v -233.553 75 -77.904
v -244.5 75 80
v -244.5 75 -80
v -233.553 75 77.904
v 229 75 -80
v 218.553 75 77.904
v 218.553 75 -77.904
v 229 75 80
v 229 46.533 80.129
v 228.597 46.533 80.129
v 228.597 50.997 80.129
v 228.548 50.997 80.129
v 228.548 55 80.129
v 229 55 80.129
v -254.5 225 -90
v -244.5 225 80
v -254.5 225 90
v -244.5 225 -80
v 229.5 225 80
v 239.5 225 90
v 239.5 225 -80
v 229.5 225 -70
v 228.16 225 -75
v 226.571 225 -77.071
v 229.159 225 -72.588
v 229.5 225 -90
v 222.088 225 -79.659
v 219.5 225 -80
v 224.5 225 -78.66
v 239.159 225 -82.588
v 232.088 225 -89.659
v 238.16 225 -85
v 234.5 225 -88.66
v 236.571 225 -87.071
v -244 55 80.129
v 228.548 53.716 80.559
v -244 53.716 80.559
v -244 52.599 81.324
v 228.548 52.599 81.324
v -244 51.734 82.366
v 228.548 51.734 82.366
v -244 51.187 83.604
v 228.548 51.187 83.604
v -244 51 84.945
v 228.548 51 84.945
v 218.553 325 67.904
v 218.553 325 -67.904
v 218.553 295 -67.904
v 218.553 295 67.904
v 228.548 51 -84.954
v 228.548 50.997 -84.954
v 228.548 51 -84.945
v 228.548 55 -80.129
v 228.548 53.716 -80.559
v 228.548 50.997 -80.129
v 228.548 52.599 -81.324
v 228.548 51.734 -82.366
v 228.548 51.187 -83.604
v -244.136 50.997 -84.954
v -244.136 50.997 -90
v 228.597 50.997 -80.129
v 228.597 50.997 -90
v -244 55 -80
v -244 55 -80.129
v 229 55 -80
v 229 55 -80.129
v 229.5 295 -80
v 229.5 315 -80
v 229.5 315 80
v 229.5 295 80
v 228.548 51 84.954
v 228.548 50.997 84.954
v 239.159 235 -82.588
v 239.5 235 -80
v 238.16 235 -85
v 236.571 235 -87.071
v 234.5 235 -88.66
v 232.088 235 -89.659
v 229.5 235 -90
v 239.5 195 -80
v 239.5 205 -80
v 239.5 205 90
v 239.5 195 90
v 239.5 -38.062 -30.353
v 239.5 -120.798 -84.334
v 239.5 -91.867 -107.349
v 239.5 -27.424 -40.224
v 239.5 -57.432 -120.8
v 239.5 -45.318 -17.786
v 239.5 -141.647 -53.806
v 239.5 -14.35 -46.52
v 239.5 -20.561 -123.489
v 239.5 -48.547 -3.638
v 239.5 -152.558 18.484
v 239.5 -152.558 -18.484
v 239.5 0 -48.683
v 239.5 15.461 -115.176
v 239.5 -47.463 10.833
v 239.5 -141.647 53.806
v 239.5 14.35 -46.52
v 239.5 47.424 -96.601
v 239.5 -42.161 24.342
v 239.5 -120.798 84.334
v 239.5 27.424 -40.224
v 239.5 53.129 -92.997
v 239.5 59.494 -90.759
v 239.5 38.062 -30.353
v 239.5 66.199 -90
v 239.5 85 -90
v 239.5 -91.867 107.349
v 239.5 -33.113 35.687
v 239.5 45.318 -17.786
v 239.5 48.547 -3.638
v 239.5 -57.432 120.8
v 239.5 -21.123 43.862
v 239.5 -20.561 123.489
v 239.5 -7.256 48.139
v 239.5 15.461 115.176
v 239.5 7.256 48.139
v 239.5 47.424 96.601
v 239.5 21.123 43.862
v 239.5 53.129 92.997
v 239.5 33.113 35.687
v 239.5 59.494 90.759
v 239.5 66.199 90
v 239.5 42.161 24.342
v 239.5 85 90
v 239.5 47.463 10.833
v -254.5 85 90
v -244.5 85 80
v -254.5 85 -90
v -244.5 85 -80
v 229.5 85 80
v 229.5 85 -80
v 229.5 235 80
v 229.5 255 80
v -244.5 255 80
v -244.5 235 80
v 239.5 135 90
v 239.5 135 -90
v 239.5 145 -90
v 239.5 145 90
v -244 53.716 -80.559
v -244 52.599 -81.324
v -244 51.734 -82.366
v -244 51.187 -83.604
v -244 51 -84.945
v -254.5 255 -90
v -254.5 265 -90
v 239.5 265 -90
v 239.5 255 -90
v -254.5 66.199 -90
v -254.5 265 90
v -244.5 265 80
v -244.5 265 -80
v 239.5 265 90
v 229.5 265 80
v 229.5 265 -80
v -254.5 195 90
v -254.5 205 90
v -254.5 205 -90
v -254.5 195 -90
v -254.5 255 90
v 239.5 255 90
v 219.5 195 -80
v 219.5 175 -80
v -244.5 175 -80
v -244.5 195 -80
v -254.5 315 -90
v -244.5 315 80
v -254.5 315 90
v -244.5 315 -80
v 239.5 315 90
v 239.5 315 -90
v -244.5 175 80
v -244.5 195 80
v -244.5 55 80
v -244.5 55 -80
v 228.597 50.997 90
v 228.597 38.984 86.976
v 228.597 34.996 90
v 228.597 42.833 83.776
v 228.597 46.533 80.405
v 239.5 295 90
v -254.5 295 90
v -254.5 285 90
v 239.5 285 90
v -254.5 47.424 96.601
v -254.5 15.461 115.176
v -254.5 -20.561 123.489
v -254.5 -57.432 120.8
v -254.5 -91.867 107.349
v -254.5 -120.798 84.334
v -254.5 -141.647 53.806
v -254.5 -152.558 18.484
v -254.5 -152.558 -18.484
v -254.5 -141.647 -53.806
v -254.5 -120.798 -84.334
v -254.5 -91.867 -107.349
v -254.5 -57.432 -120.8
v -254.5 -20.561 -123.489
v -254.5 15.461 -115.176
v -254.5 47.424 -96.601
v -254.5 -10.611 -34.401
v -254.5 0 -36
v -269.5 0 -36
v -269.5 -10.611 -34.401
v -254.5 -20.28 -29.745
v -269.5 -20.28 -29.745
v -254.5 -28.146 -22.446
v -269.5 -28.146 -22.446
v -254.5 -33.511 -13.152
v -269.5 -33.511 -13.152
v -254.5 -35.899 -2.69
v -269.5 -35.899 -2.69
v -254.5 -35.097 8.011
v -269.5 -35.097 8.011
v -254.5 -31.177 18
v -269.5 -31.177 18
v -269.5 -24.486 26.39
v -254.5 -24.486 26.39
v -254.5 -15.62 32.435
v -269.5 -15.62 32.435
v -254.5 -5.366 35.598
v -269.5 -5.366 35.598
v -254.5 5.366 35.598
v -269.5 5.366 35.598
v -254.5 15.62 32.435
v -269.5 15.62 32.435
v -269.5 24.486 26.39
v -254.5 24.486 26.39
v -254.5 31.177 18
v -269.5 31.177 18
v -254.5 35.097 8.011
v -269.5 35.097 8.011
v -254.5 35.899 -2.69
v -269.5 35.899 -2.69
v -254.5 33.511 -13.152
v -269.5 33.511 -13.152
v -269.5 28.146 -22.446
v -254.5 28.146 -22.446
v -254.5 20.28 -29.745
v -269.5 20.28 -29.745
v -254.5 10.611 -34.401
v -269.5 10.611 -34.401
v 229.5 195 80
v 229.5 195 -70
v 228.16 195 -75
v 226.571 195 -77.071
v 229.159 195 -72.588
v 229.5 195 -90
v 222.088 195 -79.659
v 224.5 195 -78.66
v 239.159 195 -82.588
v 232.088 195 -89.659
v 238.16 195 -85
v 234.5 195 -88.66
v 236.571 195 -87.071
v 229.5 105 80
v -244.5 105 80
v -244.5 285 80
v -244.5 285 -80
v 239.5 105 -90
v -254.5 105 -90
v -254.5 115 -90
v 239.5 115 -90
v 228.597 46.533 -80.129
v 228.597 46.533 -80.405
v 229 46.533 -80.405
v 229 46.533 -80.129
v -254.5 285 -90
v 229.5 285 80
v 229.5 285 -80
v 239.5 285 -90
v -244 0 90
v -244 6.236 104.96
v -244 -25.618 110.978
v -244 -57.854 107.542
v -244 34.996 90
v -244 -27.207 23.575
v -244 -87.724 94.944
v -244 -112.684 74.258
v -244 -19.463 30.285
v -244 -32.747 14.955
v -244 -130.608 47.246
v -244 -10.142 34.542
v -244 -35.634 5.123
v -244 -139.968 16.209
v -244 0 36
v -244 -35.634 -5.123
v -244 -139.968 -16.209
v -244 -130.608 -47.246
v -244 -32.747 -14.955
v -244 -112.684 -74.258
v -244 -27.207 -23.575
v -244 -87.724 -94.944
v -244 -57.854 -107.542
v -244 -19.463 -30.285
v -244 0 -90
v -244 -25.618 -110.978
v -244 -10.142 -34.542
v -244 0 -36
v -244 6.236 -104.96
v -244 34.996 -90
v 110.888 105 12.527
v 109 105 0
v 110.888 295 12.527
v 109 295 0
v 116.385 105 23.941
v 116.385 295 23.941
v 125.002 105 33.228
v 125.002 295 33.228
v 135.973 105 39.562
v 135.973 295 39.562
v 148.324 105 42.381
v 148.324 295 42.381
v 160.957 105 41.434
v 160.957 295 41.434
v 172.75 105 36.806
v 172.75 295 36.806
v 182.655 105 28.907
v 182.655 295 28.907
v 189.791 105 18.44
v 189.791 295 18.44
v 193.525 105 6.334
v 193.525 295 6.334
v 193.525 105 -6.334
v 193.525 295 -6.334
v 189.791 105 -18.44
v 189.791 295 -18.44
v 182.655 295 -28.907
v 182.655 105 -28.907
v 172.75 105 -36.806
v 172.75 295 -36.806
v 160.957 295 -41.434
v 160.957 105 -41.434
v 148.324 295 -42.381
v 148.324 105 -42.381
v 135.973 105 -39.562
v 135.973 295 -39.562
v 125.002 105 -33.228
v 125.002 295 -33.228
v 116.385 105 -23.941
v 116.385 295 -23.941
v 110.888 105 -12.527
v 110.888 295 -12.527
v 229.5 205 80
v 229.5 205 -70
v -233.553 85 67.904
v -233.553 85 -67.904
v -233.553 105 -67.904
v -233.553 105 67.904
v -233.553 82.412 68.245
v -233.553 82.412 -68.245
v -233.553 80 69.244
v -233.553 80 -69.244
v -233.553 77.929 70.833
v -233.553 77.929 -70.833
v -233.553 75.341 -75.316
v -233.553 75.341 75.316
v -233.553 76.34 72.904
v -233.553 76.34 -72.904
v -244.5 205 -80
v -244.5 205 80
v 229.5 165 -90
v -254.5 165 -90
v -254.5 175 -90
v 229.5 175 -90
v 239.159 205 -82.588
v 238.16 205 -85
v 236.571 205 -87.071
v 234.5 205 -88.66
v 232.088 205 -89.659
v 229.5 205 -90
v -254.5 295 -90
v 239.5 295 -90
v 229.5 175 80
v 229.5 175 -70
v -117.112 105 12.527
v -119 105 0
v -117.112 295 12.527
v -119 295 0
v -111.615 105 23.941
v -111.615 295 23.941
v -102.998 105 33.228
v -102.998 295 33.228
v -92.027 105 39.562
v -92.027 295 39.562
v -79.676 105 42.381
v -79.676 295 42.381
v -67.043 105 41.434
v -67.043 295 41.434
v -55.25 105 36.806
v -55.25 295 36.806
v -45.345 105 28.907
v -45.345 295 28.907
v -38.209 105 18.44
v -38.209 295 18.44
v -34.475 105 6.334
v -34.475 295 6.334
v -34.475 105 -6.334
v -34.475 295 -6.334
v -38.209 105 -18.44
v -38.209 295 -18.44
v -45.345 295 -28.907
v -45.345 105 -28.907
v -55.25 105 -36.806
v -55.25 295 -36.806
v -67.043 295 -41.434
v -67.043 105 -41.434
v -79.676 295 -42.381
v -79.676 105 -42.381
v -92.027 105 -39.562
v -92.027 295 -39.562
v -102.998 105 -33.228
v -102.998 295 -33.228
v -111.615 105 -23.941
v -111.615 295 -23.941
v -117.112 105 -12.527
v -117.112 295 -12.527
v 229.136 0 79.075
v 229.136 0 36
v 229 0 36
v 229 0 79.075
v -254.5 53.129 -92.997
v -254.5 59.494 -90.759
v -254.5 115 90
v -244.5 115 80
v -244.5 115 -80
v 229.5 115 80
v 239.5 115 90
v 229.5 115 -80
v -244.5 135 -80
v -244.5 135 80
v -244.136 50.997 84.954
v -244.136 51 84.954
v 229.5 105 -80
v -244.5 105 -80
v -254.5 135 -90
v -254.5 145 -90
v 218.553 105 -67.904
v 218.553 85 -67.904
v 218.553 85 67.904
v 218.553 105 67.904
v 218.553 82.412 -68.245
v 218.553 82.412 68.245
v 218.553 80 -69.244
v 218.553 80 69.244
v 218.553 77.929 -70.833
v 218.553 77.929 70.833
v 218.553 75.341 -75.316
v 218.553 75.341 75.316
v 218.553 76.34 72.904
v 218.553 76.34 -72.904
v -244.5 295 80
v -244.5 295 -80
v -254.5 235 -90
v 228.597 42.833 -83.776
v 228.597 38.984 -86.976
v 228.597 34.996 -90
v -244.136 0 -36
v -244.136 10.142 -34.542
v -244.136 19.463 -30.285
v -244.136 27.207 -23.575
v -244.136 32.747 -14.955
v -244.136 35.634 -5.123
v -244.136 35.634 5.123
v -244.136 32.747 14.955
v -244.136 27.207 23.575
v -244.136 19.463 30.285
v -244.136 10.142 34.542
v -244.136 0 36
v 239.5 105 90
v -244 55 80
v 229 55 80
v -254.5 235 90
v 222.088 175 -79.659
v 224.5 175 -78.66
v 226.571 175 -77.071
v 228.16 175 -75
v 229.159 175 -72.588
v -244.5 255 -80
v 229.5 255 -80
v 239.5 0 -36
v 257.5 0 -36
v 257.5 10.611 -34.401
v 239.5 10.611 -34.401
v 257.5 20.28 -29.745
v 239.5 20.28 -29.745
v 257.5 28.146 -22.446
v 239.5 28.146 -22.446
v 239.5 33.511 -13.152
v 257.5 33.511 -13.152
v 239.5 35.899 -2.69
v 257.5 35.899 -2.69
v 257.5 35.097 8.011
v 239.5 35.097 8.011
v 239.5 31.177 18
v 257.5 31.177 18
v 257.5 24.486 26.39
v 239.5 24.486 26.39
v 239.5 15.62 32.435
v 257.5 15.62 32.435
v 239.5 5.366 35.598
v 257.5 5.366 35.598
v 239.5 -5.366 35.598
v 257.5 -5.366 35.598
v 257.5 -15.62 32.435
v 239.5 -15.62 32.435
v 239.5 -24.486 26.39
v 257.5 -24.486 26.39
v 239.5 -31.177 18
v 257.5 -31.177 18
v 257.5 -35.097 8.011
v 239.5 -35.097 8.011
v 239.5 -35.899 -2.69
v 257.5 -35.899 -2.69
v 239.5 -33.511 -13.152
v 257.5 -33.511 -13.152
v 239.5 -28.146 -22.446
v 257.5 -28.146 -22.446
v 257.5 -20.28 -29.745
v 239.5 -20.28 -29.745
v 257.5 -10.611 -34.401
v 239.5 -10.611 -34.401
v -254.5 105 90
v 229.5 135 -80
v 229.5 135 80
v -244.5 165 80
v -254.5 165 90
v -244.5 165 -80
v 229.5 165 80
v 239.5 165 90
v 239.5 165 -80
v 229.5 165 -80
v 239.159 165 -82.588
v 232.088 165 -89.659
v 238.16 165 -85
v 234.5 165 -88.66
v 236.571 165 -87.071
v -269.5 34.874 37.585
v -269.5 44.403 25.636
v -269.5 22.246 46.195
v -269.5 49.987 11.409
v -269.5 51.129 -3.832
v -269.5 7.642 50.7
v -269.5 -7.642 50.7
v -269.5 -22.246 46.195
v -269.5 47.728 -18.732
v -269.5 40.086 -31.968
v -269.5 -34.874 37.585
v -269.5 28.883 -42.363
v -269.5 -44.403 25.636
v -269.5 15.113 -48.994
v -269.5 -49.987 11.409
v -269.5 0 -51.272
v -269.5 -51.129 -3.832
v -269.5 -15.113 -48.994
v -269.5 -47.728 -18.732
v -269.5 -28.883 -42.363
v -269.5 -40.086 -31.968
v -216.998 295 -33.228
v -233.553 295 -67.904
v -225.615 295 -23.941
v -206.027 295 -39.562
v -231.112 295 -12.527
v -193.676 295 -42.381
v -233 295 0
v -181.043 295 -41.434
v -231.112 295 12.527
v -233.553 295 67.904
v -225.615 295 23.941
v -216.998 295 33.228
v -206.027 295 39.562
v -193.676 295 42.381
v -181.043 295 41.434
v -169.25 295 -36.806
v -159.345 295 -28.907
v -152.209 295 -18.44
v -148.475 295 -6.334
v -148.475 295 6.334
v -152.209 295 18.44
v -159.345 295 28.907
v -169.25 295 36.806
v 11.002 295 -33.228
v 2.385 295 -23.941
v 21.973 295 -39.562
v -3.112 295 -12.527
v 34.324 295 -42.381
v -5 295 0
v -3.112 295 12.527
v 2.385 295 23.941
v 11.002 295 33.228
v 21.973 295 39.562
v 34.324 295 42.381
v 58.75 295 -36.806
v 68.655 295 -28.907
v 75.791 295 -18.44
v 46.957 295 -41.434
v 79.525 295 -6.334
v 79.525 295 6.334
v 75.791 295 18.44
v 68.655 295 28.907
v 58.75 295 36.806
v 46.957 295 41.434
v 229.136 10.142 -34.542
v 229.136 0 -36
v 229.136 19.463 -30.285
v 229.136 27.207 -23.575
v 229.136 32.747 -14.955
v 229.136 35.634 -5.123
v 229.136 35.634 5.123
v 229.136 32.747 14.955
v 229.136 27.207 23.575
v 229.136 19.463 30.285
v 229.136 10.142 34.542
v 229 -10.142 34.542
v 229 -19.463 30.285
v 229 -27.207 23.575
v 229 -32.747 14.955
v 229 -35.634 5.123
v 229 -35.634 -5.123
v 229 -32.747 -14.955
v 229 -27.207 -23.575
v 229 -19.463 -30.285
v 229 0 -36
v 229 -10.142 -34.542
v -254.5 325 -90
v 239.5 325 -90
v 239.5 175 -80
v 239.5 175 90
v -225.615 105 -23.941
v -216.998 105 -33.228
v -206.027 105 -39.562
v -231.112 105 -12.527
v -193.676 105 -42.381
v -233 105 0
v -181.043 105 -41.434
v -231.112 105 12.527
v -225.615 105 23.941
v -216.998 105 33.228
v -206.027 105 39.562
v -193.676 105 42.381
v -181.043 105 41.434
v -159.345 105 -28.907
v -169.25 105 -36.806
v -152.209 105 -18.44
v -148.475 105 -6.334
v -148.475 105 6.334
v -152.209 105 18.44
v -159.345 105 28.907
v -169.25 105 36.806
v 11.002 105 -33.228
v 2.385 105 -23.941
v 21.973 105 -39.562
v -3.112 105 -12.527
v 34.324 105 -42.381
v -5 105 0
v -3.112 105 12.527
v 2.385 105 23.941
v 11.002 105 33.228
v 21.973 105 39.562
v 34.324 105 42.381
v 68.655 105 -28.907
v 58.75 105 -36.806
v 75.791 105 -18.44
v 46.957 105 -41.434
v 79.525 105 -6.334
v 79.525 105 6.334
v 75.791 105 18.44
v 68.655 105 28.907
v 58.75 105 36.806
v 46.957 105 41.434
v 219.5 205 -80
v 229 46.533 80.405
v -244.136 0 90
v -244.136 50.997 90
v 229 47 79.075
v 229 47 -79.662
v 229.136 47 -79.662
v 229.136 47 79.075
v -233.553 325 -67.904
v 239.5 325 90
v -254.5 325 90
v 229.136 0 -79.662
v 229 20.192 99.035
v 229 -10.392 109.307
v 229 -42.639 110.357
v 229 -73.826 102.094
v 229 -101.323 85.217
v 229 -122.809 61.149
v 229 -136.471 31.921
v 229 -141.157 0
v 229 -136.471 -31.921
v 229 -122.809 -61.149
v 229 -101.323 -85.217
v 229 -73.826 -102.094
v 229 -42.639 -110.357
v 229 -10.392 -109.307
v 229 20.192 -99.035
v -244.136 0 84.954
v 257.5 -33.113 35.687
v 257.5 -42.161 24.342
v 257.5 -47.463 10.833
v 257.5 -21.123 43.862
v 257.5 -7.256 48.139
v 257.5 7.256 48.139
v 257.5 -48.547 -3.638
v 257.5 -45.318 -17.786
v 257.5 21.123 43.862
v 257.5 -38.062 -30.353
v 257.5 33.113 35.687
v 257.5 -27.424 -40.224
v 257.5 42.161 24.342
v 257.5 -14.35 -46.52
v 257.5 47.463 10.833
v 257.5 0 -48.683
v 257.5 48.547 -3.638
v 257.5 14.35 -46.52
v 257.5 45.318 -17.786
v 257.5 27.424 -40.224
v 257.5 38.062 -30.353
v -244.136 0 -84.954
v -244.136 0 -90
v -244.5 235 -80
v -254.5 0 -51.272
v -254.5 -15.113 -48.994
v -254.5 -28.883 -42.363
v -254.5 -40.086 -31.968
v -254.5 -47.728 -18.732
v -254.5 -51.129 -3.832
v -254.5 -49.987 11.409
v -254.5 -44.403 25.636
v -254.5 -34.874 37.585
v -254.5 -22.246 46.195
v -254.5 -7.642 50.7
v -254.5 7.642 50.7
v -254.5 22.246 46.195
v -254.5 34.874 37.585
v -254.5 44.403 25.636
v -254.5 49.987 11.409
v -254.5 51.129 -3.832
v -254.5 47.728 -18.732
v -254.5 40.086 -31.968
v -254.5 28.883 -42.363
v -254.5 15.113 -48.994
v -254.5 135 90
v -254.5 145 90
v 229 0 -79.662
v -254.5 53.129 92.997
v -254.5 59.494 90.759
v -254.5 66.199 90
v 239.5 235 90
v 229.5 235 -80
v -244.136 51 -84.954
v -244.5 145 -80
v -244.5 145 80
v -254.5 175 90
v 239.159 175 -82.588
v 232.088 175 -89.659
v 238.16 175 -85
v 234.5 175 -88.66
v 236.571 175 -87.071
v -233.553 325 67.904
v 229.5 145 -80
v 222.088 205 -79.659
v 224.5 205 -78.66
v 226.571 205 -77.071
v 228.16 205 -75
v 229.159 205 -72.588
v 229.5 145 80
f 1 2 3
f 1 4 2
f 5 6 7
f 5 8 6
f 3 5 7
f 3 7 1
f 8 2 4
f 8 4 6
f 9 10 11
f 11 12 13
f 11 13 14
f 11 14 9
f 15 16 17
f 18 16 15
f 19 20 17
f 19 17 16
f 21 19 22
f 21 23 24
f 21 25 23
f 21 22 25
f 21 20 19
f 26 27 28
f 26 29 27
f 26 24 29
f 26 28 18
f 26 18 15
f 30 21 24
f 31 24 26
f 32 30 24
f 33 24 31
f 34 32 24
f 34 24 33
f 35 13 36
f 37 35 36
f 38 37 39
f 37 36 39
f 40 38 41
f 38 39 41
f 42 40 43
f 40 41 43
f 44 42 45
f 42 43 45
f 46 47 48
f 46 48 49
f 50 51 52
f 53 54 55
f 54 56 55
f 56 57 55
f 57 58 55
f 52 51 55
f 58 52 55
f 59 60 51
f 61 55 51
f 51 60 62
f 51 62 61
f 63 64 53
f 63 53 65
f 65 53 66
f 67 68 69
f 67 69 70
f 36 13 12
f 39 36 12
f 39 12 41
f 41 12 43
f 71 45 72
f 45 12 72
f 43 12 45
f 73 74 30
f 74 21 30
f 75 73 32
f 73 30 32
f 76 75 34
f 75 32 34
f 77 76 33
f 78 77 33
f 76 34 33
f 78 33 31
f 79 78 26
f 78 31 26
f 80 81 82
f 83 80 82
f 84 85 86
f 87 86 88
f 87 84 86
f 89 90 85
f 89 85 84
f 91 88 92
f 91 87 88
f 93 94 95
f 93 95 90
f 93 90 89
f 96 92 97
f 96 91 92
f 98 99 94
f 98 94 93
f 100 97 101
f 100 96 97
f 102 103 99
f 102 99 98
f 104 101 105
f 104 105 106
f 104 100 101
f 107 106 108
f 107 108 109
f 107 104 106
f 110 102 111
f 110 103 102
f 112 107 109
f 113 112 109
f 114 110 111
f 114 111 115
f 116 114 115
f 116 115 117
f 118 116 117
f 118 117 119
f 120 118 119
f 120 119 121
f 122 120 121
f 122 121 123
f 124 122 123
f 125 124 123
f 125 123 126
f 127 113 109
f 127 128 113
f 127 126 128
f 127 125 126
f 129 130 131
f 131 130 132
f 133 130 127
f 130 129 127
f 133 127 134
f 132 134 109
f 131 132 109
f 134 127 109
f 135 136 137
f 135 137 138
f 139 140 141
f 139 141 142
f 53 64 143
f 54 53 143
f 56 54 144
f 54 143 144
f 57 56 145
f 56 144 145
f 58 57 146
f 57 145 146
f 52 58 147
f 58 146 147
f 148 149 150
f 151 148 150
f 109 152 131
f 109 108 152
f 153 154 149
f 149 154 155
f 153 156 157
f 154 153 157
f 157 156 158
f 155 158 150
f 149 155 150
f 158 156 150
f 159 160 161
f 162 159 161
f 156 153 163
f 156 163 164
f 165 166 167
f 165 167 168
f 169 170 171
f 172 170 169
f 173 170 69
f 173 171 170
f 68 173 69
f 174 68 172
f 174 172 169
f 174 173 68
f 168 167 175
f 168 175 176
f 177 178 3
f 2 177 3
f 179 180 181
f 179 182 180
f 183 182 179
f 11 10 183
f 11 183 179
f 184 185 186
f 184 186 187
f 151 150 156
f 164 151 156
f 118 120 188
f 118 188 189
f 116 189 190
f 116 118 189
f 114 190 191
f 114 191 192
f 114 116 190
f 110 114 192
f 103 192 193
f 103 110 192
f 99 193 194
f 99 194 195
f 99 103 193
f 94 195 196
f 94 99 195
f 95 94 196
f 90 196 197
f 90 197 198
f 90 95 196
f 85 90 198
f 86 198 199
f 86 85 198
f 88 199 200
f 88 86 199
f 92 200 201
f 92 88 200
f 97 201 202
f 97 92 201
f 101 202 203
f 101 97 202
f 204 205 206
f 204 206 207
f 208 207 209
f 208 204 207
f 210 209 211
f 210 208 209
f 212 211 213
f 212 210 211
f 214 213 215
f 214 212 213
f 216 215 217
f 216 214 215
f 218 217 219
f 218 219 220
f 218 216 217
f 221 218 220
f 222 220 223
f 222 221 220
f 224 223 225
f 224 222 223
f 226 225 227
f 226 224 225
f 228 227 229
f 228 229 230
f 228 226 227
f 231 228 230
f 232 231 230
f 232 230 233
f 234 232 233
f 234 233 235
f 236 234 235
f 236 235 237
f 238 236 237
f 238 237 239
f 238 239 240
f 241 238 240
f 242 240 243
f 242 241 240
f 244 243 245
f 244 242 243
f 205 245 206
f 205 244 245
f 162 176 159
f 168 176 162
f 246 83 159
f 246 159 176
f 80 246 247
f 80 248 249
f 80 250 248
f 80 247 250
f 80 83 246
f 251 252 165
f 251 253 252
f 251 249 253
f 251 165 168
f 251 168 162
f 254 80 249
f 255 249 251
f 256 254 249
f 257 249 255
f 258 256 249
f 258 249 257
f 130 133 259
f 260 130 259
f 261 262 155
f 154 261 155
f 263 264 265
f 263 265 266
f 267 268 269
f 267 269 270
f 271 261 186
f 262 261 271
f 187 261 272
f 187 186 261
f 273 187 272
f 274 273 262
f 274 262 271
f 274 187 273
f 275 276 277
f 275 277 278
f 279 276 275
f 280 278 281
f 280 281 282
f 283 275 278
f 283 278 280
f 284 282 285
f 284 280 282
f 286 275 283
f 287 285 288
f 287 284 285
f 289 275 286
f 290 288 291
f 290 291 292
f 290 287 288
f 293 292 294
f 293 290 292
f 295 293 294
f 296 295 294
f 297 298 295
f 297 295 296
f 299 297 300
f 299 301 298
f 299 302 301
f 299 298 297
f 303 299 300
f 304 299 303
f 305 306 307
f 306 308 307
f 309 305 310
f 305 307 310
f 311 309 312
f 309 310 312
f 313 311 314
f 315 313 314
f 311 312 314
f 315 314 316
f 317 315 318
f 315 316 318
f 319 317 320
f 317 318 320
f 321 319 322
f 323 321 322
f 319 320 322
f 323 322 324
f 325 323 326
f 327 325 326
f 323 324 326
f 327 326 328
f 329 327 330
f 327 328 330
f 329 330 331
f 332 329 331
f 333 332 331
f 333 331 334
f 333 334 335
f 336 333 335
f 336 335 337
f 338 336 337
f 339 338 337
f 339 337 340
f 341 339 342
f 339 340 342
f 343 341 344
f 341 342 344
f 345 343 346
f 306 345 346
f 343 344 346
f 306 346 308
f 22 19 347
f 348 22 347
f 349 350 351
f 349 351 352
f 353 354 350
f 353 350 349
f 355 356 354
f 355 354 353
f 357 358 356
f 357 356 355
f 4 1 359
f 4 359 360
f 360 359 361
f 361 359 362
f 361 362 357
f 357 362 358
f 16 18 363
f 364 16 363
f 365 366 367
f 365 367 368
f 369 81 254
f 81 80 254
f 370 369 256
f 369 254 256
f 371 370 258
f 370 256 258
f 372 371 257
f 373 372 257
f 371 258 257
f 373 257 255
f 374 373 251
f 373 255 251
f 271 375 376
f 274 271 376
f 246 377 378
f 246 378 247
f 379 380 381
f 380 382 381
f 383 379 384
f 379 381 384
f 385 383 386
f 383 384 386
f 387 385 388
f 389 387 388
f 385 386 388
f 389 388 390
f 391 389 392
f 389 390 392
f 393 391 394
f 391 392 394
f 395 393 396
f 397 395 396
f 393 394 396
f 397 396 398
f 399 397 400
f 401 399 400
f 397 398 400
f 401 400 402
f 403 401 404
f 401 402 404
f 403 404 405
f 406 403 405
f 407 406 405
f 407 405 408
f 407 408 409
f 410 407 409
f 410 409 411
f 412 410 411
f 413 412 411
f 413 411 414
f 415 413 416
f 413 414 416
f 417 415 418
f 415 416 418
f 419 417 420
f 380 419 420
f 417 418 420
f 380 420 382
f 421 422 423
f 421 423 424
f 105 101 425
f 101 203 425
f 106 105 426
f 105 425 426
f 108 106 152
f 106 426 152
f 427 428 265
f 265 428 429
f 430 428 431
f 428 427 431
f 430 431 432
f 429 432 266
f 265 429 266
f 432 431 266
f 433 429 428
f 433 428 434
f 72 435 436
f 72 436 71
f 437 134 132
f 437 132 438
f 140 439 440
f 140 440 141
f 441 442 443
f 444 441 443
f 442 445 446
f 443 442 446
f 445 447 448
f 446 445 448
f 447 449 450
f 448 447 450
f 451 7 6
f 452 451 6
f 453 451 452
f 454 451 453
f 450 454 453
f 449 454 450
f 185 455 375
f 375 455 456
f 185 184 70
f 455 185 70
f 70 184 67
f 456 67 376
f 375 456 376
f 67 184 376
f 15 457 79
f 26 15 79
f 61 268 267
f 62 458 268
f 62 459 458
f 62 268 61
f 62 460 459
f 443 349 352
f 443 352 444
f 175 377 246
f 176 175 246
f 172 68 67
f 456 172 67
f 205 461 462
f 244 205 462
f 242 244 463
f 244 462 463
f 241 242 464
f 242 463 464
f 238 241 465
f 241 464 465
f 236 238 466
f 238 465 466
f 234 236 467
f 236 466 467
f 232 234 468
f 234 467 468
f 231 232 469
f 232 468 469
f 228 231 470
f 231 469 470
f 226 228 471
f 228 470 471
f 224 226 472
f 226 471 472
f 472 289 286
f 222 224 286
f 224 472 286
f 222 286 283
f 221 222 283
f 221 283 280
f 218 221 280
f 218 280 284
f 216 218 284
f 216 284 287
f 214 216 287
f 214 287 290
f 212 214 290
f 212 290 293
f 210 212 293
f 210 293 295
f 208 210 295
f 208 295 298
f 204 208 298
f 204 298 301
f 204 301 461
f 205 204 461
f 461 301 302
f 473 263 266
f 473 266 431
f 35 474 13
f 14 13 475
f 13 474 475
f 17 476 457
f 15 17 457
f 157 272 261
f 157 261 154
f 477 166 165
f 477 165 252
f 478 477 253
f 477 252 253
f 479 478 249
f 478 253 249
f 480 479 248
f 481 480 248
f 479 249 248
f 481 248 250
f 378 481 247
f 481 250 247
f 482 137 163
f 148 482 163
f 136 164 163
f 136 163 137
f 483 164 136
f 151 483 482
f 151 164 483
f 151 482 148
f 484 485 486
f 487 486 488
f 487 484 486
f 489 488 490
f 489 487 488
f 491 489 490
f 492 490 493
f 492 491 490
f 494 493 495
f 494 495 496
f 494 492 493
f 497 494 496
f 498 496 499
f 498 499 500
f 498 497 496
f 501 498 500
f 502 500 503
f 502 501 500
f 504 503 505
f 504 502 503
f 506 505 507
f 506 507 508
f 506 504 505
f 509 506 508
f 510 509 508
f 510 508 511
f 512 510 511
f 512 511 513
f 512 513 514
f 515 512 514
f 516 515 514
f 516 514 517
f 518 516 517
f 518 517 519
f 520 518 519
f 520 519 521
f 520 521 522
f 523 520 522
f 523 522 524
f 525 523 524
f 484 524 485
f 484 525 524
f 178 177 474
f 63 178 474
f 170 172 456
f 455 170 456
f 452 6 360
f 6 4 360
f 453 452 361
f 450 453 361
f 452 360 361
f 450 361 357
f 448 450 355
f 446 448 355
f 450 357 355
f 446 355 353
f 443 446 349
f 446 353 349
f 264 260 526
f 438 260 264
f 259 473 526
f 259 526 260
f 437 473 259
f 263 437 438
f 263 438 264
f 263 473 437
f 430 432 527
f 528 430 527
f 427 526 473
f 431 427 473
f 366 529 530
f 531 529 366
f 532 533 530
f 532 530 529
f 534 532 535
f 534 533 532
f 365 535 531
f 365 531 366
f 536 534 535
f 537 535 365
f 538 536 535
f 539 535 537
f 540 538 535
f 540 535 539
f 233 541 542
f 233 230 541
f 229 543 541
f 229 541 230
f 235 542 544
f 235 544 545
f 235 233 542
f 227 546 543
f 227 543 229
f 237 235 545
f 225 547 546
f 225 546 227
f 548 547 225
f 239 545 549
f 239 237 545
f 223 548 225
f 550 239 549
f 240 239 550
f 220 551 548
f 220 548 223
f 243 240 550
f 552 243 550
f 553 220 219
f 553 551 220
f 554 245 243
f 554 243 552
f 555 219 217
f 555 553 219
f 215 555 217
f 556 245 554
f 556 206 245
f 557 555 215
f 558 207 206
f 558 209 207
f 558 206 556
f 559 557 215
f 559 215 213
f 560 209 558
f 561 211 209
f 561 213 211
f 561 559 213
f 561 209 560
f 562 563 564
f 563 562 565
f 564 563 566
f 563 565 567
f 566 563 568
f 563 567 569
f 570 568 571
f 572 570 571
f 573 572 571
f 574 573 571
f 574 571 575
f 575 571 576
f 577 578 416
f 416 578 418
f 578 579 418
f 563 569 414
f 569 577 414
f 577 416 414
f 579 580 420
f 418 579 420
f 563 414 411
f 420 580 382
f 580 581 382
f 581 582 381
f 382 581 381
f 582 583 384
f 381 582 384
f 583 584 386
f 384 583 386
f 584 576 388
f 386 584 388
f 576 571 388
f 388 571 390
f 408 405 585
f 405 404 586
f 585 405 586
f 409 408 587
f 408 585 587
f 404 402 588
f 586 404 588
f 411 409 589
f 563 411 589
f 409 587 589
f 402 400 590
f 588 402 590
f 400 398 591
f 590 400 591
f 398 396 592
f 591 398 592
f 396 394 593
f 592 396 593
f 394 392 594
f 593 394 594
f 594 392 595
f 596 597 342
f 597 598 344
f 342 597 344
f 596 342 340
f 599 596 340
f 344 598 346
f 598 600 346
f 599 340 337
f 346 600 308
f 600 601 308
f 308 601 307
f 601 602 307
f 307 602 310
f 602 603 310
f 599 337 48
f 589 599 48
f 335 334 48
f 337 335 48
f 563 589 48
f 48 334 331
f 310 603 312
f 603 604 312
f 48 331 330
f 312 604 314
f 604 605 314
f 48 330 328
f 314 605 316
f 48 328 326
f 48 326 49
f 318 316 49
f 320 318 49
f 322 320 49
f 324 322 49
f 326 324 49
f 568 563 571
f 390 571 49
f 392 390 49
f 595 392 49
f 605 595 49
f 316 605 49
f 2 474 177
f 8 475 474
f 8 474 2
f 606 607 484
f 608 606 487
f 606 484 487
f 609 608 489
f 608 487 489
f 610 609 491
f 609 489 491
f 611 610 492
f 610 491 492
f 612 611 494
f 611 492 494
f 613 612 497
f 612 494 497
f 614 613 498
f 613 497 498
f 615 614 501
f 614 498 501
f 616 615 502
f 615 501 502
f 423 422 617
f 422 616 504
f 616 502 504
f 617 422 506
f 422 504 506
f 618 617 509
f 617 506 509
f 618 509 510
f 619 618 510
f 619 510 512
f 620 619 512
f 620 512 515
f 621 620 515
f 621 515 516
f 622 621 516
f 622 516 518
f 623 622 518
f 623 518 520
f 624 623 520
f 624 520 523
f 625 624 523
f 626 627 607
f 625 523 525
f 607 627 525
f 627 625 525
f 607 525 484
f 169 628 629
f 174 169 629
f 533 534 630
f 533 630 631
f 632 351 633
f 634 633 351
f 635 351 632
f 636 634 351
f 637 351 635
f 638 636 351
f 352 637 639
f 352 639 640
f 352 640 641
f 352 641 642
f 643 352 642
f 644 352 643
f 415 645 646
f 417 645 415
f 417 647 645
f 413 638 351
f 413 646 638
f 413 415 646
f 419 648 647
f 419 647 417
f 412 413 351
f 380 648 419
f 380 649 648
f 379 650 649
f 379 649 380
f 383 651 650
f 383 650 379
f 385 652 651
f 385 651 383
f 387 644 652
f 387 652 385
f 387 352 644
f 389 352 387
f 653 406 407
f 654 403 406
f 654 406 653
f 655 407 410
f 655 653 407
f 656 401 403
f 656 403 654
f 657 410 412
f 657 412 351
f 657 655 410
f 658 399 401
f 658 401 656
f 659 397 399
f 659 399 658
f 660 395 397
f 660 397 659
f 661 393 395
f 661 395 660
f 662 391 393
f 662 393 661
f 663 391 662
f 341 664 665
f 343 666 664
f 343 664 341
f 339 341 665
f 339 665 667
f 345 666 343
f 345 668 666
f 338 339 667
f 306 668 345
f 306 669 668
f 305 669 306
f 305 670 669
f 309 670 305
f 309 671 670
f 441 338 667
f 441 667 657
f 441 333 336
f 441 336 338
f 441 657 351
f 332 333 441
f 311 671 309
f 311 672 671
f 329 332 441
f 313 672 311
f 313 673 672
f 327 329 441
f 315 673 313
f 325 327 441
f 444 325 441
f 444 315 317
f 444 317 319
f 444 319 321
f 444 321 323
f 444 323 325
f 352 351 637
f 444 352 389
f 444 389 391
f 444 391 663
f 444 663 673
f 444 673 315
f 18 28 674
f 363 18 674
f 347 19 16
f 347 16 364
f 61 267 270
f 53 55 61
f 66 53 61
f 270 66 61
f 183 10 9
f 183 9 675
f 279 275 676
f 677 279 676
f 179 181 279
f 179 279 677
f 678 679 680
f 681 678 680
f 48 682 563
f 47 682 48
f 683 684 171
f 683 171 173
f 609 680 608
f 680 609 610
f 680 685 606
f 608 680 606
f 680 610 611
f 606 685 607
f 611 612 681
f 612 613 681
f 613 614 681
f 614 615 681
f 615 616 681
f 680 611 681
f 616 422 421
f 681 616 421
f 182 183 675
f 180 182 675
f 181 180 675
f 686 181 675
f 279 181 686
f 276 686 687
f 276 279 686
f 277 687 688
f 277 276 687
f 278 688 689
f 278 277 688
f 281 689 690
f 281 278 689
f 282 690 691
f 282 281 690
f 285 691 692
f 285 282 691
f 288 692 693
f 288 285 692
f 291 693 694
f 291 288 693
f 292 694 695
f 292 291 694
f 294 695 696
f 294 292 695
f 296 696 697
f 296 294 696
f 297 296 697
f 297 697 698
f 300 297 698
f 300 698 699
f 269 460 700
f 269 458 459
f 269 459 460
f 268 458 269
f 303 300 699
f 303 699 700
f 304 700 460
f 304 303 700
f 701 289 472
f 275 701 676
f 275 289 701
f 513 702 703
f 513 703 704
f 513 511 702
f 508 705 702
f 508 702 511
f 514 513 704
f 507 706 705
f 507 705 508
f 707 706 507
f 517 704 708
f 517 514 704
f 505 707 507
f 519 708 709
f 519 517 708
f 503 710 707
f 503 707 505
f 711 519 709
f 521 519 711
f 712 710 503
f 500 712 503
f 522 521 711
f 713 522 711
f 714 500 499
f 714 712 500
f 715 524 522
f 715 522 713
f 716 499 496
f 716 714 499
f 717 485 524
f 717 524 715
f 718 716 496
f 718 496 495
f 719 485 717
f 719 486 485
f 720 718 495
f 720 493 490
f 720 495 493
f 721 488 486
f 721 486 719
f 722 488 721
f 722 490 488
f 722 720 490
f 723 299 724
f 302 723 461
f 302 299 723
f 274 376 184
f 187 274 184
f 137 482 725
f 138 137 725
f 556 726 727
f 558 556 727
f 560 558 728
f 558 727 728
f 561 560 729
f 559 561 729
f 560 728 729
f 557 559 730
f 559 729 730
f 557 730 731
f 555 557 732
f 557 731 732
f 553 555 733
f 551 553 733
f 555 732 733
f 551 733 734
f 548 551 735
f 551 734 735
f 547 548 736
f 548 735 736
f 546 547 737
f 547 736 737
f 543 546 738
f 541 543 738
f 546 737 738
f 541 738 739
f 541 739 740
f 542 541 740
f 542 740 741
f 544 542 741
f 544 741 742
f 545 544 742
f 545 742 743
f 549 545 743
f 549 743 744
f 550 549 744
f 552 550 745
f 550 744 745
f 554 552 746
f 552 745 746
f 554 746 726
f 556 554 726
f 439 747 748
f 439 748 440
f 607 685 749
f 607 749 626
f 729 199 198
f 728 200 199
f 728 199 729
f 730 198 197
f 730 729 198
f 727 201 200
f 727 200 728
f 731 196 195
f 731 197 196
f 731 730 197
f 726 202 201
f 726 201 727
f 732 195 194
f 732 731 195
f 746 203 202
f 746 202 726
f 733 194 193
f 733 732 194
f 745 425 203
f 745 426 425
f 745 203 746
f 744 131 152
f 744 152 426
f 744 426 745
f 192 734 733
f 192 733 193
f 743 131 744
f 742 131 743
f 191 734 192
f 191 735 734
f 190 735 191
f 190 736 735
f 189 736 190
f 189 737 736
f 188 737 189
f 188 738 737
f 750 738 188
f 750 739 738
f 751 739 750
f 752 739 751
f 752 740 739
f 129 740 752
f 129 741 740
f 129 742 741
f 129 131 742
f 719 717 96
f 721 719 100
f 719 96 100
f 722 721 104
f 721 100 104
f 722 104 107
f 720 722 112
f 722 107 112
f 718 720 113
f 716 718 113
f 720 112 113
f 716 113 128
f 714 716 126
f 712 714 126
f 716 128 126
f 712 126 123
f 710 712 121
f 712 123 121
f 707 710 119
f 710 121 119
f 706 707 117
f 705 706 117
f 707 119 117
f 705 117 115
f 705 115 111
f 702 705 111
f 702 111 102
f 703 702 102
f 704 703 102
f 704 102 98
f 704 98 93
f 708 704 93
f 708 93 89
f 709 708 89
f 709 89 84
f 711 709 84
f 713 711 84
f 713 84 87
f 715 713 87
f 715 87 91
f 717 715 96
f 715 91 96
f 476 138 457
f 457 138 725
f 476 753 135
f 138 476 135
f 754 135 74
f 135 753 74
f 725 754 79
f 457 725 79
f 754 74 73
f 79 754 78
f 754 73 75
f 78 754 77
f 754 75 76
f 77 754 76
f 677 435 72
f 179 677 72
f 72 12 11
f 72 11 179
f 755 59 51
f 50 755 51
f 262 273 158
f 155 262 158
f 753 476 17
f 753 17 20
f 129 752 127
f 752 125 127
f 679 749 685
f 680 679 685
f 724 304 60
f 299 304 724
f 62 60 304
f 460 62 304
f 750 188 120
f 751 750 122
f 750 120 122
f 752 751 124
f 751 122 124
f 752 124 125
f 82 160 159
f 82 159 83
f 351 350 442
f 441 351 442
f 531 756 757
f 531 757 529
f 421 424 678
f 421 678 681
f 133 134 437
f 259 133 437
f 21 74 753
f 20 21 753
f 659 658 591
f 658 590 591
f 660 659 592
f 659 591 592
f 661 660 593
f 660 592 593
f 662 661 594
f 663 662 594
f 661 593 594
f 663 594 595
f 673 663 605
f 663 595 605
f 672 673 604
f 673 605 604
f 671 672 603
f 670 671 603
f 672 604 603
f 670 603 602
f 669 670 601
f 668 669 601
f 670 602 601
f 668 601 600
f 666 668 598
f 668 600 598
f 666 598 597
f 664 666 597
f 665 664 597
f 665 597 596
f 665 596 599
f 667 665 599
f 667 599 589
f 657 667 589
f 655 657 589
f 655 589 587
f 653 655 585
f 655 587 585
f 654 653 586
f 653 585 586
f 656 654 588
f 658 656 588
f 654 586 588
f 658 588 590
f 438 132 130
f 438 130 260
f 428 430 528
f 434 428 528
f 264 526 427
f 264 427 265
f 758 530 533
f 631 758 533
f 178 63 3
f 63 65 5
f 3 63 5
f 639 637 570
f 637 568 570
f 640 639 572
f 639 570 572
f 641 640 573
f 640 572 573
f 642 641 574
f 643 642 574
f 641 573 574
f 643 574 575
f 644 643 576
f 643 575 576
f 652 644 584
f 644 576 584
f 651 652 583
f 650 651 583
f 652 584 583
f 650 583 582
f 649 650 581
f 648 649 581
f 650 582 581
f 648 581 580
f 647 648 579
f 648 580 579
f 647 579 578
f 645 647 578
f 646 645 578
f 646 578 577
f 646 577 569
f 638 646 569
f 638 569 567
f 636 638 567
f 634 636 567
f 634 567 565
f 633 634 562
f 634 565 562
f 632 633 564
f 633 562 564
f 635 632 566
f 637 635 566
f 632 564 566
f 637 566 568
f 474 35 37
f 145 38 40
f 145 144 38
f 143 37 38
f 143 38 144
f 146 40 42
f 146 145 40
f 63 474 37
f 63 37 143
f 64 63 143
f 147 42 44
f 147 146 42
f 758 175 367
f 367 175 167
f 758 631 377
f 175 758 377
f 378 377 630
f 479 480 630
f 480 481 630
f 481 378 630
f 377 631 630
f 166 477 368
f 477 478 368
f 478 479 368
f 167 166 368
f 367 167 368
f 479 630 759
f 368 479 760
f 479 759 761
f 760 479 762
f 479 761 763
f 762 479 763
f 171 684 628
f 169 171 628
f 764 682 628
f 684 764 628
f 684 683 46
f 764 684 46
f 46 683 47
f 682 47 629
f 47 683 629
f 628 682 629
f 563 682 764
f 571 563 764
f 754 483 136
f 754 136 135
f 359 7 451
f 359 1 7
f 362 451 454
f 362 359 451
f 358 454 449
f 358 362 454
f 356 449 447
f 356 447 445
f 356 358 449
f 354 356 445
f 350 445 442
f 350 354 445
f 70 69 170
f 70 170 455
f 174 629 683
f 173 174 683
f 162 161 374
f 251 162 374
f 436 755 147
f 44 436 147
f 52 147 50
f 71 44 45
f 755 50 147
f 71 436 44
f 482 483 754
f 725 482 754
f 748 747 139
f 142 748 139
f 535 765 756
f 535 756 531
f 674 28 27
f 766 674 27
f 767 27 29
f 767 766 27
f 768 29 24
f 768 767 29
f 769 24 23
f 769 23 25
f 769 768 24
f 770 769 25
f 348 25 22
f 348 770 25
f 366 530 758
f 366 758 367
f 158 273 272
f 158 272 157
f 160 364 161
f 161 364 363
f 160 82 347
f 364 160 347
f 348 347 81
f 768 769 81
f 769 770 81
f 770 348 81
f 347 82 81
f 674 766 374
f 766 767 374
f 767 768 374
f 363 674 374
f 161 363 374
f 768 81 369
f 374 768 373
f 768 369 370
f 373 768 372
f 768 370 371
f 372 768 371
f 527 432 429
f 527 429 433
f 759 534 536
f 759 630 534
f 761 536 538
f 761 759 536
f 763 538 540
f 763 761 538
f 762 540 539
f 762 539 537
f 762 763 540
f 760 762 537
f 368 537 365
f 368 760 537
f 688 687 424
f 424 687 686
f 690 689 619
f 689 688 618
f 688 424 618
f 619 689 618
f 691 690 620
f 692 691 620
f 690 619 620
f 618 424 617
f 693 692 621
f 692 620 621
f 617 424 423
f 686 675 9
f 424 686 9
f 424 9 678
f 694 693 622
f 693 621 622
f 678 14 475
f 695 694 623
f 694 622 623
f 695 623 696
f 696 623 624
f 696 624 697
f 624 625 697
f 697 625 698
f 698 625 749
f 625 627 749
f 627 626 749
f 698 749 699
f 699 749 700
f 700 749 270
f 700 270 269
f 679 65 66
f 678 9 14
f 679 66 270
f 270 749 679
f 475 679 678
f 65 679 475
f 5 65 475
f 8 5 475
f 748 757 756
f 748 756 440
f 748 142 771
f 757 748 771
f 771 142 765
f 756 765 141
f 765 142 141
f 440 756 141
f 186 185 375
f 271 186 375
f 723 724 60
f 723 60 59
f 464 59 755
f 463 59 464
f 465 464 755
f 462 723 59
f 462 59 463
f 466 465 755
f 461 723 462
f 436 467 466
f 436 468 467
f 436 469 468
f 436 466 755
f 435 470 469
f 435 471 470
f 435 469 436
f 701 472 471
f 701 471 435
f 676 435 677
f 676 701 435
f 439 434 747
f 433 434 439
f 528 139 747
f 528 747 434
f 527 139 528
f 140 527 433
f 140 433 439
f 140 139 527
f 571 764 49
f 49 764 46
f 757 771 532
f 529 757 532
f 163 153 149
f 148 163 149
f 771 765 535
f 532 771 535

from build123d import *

# Parameters (mm, degrees)
SKETCH1_W                 = 509
SKETCH1_H                 = 180
BOSS_EXTRUDE2_DEPTH       = 200
CUT_EXTRUDE2_DEPTH        = 336.961679362
CUT_EXTRUDE2_DEPTH_BACK   = 200
CUT_EXTRUDE4_DEPTH        = 336.961679362
SKETCH6_W                 = 10
SKETCH6_H                 = 20
CUT_EXTRUDE10_DEPTH       = 541.496068441
SKETCH12_W                = 10
SKETCH12_H                = 20
CUT_EXTRUDE11_DEPTH       = 371.365022647
SKETCH4_W                 = 10
SKETCH4_H                 = 20
CUT_EXTRUDE12_DEPTH       = 371.365022647
FILLET1_R                 = 10
SKETCH17_W                = 452.106634796
SKETCH17_H                = 135.808364938
CUT_EXTRUDE14_DEPTH       = 105
SKETCH16_R                = 36
CUT_EXTRUDE15_DEPTH       = 541.496068441
SKETCH19_W                = 473.271574788
SKETCH19_H                = 158.737049928
CUT_EXTRUDE16_DEPTH       = 47
SKETCH22_W                = 494
SKETCH22_H                = 179.65703746
CUT_EXTRUDE20_DEPTH       = 75
SKETCH23_W                = 472.683659788
SKETCH23_H                = 169.907434924
CUT_EXTRUDE21_DEPTH       = 51
CUT_EXTRUDE22_DEPTH       = 189
CUT_EXTRUDE22_DEPTH_BACK  = 33
SKETCH27_W                = 472.732368702
SKETCH27_H                = 50.997060285
BOSS_EXTRUDE5_DEPTH       = 494
SKETCH30_R                = 36
CUT_EXTRUDE24_DEPTH       = 605.153312137
CUT_EXTRUDE25_DEPTH       = 236.5
BOSS_EXTRUDE10_DEPTH      = 10
BOSS_EXTRUDE10_DEPTH_BACK = 484
SKETCH35_W                = 10
SKETCH35_H                = 20
BOSS_EXTRUDE11_DEPTH      = 10
BOSS_EXTRUDE11_DEPTH_BACK = 484
SKETCH38_W                = 10
SKETCH38_H                = 20
SKETCH40_W                = 160
SKETCH40_H                = 20
CUT_EXTRUDE26_DEPTH       = 484
SKETCH41_W                = 473
SKETCH41_H                = 160.25738228
CUT_EXTRUDE27_DEPTH       = 29
SKETCH39_W                = 10
SKETCH39_H                = 20
BOSS_EXTRUDE12_DEPTH      = 160
SKETCH43_W                = 10.5
SKETCH43_H                = 20
BOSS_EXTRUDE13_DEPTH      = 160
FILLET5_R                 = 30
FILLET6_R                 = 30
FILLET7_R                 = 10
FILLET8_R                 = 10
FILLET9_R                 = 4.9
SKETCH44_R                = 48.683185172
SKETCH44_R_2              = 36
BOSS_EXTRUDE14_DEPTH      = 18
SKETCH45_R                = 51.27217623
SKETCH45_R_2              = 36
BOSS_EXTRUDE15_DEPTH      = 15


with BuildPart() as part:
    # Sketch1 → Boss-Extrude2 (new body)
    with BuildSketch(Plane(origin=(0, 0, 0), x_dir=(1, 0, 0), z_dir=(0, 1, 0))):
        Rectangle(SKETCH1_W, SKETCH1_H)
    extrude(amount=BOSS_EXTRUDE2_DEPTH)

    # Sketch3 → Cut-Extrude2 (cut, two sides: drawn at the far end of the back side and taken through both)
    with BuildSketch(Plane(origin=(0, 200, 0), x_dir=(1, 0, 0), z_dir=(0, 1, 0)).offset(-CUT_EXTRUDE2_DEPTH_BACK)):
        Polygon((254.5, -1179.779607142), (254.5, -90), (254.5, 90), (239.5, 90), (239.5, -90), (239.5, -1179.779607142), (239.5, -3359.338821426), (254.5, -3359.338821426), align=None)
    extrude(amount=CUT_EXTRUDE2_DEPTH + CUT_EXTRUDE2_DEPTH_BACK, mode=Mode.SUBTRACT)

    # Sketch2 → Cut-Extrude4 (cut, through all)
    with BuildSketch(Plane(origin=(0, 200, 0), x_dir=(1, 0, 0), z_dir=(0, 1, 0))):
        with BuildLine():
            Line((-233, 0), (-190.5, 0))
            Line((-190.5, 0), (-148, 0))
            ThreePointArc((-148, 0), (-190.5, 42.5), (-233, 0))
        make_face()
        with BuildLine():
            Line((-148, 0), (-190.5, 0))
            Line((-190.5, 0), (-233, 0))
            ThreePointArc((-233, 0), (-190.5, -42.5), (-148, 0))
        make_face()
        with BuildLine():
            ThreePointArc((-34, 0), (-76.5, 42.5), (-119, 0))
            Line((-119, 0), (-76.5, 0))
            Line((-76.5, 0), (-34, 0))
        make_face()
        with BuildLine():
            Line((-76.5, 0), (-119, 0))
            ThreePointArc((-119, 0), (-76.5, -42.5), (-34, 0))
            Line((-34, 0), (-76.5, 0))
        make_face()
        with BuildLine():
            ThreePointArc((80, 0), (37.5, 42.5), (-5, 0))
            Line((-5, 0), (37.5, 0))
            Line((37.5, 0), (80, 0))
        make_face()
        with BuildLine():
            Line((37.5, 0), (-5, 0))
            ThreePointArc((-5, 0), (37.5, -42.5), (80, 0))
            Line((80, 0), (37.5, 0))
        make_face()
        with BuildLine():
            ThreePointArc((194, 0), (151.5, 42.5), (109, 0))
            Line((109, 0), (151.5, 0))
            Line((151.5, 0), (194, 0))
        make_face()
        with BuildLine():
            Line((151.5, 0), (109, 0))
            ThreePointArc((109, 0), (151.5, -42.5), (194, 0))
            Line((194, 0), (151.5, 0))
        make_face()
    extrude(amount=-CUT_EXTRUDE4_DEPTH, mode=Mode.SUBTRACT)

    # Sketch6 → Cut-Extrude10 (cut, through all)
    with BuildSketch(Plane(origin=(239.5, 0, 0), x_dir=(0, 0, -1), z_dir=(1, 0, 0))):
        with Locations((-85, 185)):
            Rectangle(SKETCH6_W, SKETCH6_H)
        with Locations((-85, 155)):
            Rectangle(SKETCH6_W, SKETCH6_H)
        with Locations((-85, 125)):
            Rectangle(SKETCH6_W, SKETCH6_H)
        with Locations((-85, 95)):
            Rectangle(SKETCH6_W, SKETCH6_H)
        with Locations((-85, 65)):
            Rectangle(SKETCH6_W, SKETCH6_H)
    cut_extrude10 = extrude(amount=-CUT_EXTRUDE10_DEPTH, mode=Mode.SUBTRACT)

    # Sketch12 → Cut-Extrude11 (cut, through all)
    with BuildSketch(Plane.XY.offset(90)):
        with Locations((234.5, 185)):
            Rectangle(SKETCH12_W, SKETCH12_H)
        with Locations((234.5, 155)):
            Rectangle(SKETCH12_W, SKETCH12_H)
        with Locations((234.5, 125)):
            Rectangle(SKETCH12_W, SKETCH12_H)
        with Locations((234.5, 95)):
            Rectangle(SKETCH12_W, SKETCH12_H)
        with Locations((234.5, 65)):
            Rectangle(SKETCH12_W, SKETCH12_H)
    extrude(amount=-CUT_EXTRUDE11_DEPTH, mode=Mode.SUBTRACT)

    # Sketch4 → Cut-Extrude12 (cut, through all)
    with BuildSketch(Plane.XY.offset(90)):
        with Locations((-249.5, 185)):
            Rectangle(SKETCH4_W, SKETCH4_H)
        with Locations((-249.5, 155)):
            Rectangle(SKETCH4_W, SKETCH4_H)
        with Locations((-249.5, 95)):
            Rectangle(SKETCH4_W, SKETCH4_H)
        with Locations((-249.5, 65)):
            Rectangle(SKETCH4_W, SKETCH4_H)
        with Locations((-249.5, 125)):
            Rectangle(SKETCH4_W, SKETCH4_H)
    extrude(amount=-CUT_EXTRUDE12_DEPTH, mode=Mode.SUBTRACT)

    # Mirror3: Cut-Extrude10 across plane
    add(cut_extrude10.mirror(Plane.XY), mode=Mode.SUBTRACT)

    # Fillet1
    fillet1_edges = [part.edges().sort_by_distance(p)[0] for p in [
        (239.5, 170, -90),
        (239.5, 197.5, -90),
        (229.5, 185, -80),
    ]]
    fillet(fillet1_edges, radius=FILLET1_R)

    # Sketch17 → Cut-Extrude14 (cut)
    with BuildSketch(Plane.XZ):
        with Locations((-7.5, 0)):
            Rectangle(SKETCH17_W, SKETCH17_H)
    extrude(amount=-CUT_EXTRUDE14_DEPTH, mode=Mode.SUBTRACT)

    # Sketch16 → Cut-Extrude15 (cut, through all)
    with BuildSketch(Plane(origin=(239.5, 0, 0), x_dir=(0, 0, -1), z_dir=(1, 0, 0))):
        Circle(SKETCH16_R)
    extrude(amount=-CUT_EXTRUDE15_DEPTH, mode=Mode.SUBTRACT)

    # Sketch19 → Cut-Extrude16 (cut)
    with BuildSketch(Plane.XZ):
        with Locations((-7.5, -0.2939575)):
            Rectangle(SKETCH19_W, SKETCH19_H)
    extrude(amount=-CUT_EXTRUDE16_DEPTH, mode=Mode.SUBTRACT)

    # Mirror10: part across plane


with BuildPart() as part_1:
    add(part.part)
    add(part.part.mirror(Plane.ZX.offset(200)))

    # Sketch22 → Cut-Extrude20 (cut)
    with BuildSketch(Plane(origin=(0, 400, 0), x_dir=(1, 0, 0), z_dir=(0, 1, 0))):
        with Locations((-7.5, -0.17148127)):
            Rectangle(SKETCH22_W, SKETCH22_H)
    extrude(amount=-CUT_EXTRUDE20_DEPTH, mode=Mode.SUBTRACT)


with BuildPart() as body_2:
    # of the pieces the cut leaves, the one that is kept (cut_extrude20_keep)
    add(part_1.part.solids().sort_by_distance((239.5, 165, -80))[0])

    # Sketch23 → Cut-Extrude21 (cut)
    with BuildSketch(Plane.XZ):
        with Locations((-7.7939575, 0)):
            Rectangle(SKETCH23_W, SKETCH23_H)
    extrude(amount=-CUT_EXTRUDE21_DEPTH, mode=Mode.SUBTRACT)

    # Sketch27 → Cut-Extrude22 (cut, two sides: drawn at the far end of the back side and taken through both)
    with BuildSketch(Plane.XY.offset(-84.953717462).offset(-CUT_EXTRUDE22_DEPTH_BACK)):
        with Locations((-7.769603043, 25.498530143)):
            Rectangle(SKETCH27_W, SKETCH27_H)
    extrude(amount=CUT_EXTRUDE22_DEPTH + CUT_EXTRUDE22_DEPTH_BACK, mode=Mode.SUBTRACT)

    # Sketch28 → Boss-Extrude5 (add)
    with BuildSketch(Plane(origin=(239.5, 0, 0), x_dir=(0, 0, -1), z_dir=(1, 0, 0))):
        with BuildLine():
            ThreePointArc((-90, 55), (0, -153.945169347), (90, 55))
            Line((90, 55), (90, 0))
            Line((90, 0), (36, 0))
            ThreePointArc((36, 0), (0, 36), (-36, 0))
            Line((-36, 0), (-90, 0))
            Line((-90, 0), (-90, 55))
        make_face()
    extrude(amount=-BOSS_EXTRUDE5_DEPTH)

    # Sketch30 → Cut-Extrude24 (cut, through all)
    with BuildSketch(Plane(origin=(239.5, 0, 0), x_dir=(0, 0, -1), z_dir=(1, 0, 0))):
        Circle(SKETCH30_R)
    extrude(amount=-CUT_EXTRUDE24_DEPTH, mode=Mode.SUBTRACT)

    # Sketch31 → Cut-Extrude25 (cut, symmetric)
    with BuildSketch(Plane.ZY.offset(7.5)):
        with BuildLine():
            Line((-80.405401165, 46.53327076), (80.405401165, 46.53327076))
            ThreePointArc((80.405401165, 46.53327076), (0, -141.157411505), (-80.405401165, 46.53327076))
        make_face()
    extrude(amount=CUT_EXTRUDE25_DEPTH, both=True, mode=Mode.SUBTRACT)

    # Sketch35 → Boss-Extrude10 (add, two sides: drawn at the far end of the back side and taken through both)
    with BuildSketch(Plane.ZY.offset(244.5).offset(-BOSS_EXTRUDE10_DEPTH_BACK)):
        with Locations((85, 65)):
            Rectangle(SKETCH35_W, SKETCH35_H)
    extrude(amount=BOSS_EXTRUDE10_DEPTH + BOSS_EXTRUDE10_DEPTH_BACK)

    # Sketch38 → Boss-Extrude11 (add, two sides: drawn at the far end of the back side and taken through both)
    with BuildSketch(Plane.ZY.offset(244.5).offset(-BOSS_EXTRUDE11_DEPTH_BACK)):
        with Locations((-85, 65)):
            Rectangle(SKETCH38_W, SKETCH38_H)
    extrude(amount=BOSS_EXTRUDE11_DEPTH + BOSS_EXTRUDE11_DEPTH_BACK)

    # Sketch40 → Cut-Extrude26 (cut)
    with BuildSketch(Plane.ZY.offset(244.5)):
        with Locations((0, 65)):
            Rectangle(SKETCH40_W, SKETCH40_H)
    extrude(amount=-CUT_EXTRUDE26_DEPTH, mode=Mode.SUBTRACT)

    # Sketch41 → Cut-Extrude27 (cut)
    with BuildSketch(Plane(origin=(0, 55, 0), x_dir=(1, 0, 0), z_dir=(0, 1, 0))):
        with Locations((-7.5, 0)):
            Rectangle(SKETCH41_W, SKETCH41_H)
    extrude(amount=-CUT_EXTRUDE27_DEPTH, mode=Mode.SUBTRACT)

    # Sketch39 → Boss-Extrude12 (add)
    with BuildSketch(Plane(origin=(0, 0, 80), x_dir=(-1, 0, 0), z_dir=(0, 0, -1))):
        with Locations((249.5, 65)):
            Rectangle(SKETCH39_W, SKETCH39_H)
    extrude(amount=BOSS_EXTRUDE12_DEPTH)

    # Sketch43 → Boss-Extrude13 (add)
    with BuildSketch(Plane(origin=(0, 0, 80), x_dir=(-1, 0, 0), z_dir=(0, 0, -1))):
        with Locations((-234.25, 65)):
            Rectangle(SKETCH43_W, SKETCH43_H)
    extrude(amount=BOSS_EXTRUDE13_DEPTH)

    # Fillet5
    fillet5_edges = [body_2.edges().sort_by_distance(p)[0] for p in [
        (-7.5, 55, 90),
    ]]
    fillet(fillet5_edges, radius=FILLET5_R)

    # Fillet6
    fillet6_edges = [body_2.edges().sort_by_distance(p)[0] for p in [
        (-7.5, 55, -90),
    ]]
    fillet(fillet6_edges, radius=FILLET6_R)

    # Fillet7
    fillet7_edges = [body_2.edges().sort_by_distance(p)[0] for p in [
        (-7.5, 75, -67.904182469),
    ]]
    fillet(fillet7_edges, radius=FILLET7_R)

    # Fillet8
    fillet8_edges = [body_2.edges().sort_by_distance(p)[0] for p in [
        (-7.5, 75, 67.904182469),
    ]]
    fillet(fillet8_edges, radius=FILLET8_R)

    # Fillet9
    # the kernel refuses this fillet: 4.9 mm, written as the material it takes off along each edge
    with BuildSketch(Plane(origin=(228.547872394, 51, 80.12869114), x_dir=(0, 0, 1), z_dir=(-1, 0, 0)), Plane(origin=(-244, 51, -80.12869114), x_dir=(0, 0, -1), z_dir=(1, 0, 0))) as fillet9_piece_1:
        with BuildLine():
            CenterArc((4.816637832, 4.9), FILLET9_R, 190.583802597, 79.416197403)
            Line((0, 4), (0, 0))
            Line((0, 0), (4.816637832, 0))
        make_face()
    extrude(amount=472.547872394, mode=Mode.SUBTRACT)

    # Sketch44 → Boss-Extrude14 (add)
    with BuildSketch(Plane(origin=(239.5, 0, 0), x_dir=(0, 0, -1), z_dir=(1, 0, 0))):
        Circle(SKETCH44_R)
        Circle(SKETCH44_R_2, mode=Mode.SUBTRACT)
    extrude(amount=BOSS_EXTRUDE14_DEPTH)

    # Sketch45 → Boss-Extrude15 (add)
    with BuildSketch(Plane.ZY.offset(254.5)):
        with Locations(Location((0, 0, 0), (0, 0, 180))):
            Circle(SKETCH45_R)
        with Locations(Location((0, 0, 0), (0, 0, 180))):
            Circle(SKETCH45_R_2, mode=Mode.SUBTRACT)
    extrude(amount=BOSS_EXTRUDE15_DEPTH)


solid = body_2.part
